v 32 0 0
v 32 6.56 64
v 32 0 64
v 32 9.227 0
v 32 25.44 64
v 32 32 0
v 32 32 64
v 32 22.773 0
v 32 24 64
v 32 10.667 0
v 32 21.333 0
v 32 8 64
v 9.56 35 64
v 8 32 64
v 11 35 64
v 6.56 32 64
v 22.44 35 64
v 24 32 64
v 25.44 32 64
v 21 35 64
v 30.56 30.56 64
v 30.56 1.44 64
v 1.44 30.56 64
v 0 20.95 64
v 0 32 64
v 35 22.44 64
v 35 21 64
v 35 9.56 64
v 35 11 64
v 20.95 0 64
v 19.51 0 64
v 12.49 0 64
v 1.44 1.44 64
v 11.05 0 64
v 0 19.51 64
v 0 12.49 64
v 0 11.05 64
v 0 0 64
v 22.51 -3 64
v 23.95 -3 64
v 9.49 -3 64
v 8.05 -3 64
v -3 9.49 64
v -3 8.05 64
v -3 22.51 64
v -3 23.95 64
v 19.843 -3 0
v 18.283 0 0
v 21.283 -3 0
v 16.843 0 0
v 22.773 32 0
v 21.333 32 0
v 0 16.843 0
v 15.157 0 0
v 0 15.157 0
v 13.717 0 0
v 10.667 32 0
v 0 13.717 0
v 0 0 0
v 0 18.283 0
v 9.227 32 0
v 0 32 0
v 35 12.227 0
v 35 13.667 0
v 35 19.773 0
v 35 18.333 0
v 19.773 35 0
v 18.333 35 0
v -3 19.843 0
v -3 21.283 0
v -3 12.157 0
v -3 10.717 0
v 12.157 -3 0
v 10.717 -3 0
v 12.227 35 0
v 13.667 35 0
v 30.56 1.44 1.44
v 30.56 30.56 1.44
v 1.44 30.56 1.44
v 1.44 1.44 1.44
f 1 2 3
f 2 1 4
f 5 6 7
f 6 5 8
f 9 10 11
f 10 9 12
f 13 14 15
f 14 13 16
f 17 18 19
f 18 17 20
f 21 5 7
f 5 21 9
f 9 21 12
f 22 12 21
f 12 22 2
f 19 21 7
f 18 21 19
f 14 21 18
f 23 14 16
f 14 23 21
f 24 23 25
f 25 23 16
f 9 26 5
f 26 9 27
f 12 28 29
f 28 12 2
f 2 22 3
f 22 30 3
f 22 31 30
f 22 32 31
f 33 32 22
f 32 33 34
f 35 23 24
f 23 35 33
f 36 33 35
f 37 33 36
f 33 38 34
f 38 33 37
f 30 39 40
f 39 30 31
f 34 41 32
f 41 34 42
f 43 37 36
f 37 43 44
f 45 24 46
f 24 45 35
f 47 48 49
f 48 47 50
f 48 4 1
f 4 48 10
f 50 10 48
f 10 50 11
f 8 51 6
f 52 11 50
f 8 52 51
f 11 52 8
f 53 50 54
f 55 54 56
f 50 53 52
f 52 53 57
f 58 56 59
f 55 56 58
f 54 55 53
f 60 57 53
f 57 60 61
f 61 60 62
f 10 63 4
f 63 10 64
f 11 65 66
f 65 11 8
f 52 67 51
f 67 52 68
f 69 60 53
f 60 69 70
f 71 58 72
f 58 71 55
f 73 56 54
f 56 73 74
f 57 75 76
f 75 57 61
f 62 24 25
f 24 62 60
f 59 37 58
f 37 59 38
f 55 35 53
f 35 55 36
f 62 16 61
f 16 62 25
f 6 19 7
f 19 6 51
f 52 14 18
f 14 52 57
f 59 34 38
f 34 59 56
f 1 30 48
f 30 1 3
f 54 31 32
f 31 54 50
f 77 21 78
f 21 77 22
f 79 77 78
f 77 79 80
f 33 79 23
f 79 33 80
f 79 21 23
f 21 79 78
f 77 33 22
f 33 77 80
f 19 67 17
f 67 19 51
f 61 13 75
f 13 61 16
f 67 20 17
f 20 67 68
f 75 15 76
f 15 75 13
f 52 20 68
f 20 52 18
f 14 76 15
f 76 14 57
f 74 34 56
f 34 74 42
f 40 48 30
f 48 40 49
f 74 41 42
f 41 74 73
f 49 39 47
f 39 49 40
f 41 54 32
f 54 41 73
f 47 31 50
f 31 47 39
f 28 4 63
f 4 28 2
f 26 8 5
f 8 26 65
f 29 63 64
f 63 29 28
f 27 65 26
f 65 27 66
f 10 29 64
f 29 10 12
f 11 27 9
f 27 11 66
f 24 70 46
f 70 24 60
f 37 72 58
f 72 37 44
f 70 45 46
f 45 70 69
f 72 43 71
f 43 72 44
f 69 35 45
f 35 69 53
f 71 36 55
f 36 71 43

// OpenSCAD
// file: src/units.scad
/* * units.scad
 *
 * Part of the Modular Drawer System.
 *
 * (c) 2015 max thom stahl. Released under the Creative Commons Share-Alike
 * license. See LICENSE for details.
 */

include <configuration.scad>
include <connectors.scad>

module unit(w, h) {
  difference() {
    cube([UNIT_X * w, UNIT_Y * h, UNIT_Z]);
    translate([WALL_THICKNESS, WALL_THICKNESS, WALL_THICKNESS])
      cube([w*UNIT_X - 2*WALL_THICKNESS, h*UNIT_Y - 2*WALL_THICKNESS, UNIT_Z]);
  }
  for(i = [0:w-1]) {
    translate([i*UNIT_X + UNIT_X/2, h*UNIT_Y, 0])
      rotate([0,0,90])
      connector_female();
    translate([i*UNIT_X + UNIT_X/2, -GROOVE_DEPTH, 0])
      rotate([0,0,270])
      connector_male();
  }
  for(j = [0:h-1]) {
    translate([w*UNIT_X, j*UNIT_Y + UNIT_Y/2, 0])
      rotate([0,0,0])
      connector_female();
    translate([-GROOVE_DEPTH, j*UNIT_Y + UNIT_Y/2, 0])
      rotate([0,0,180])
      connector_male();
  }
}
// file: src/drawers.scad
/*
 * drawers.scad
 *
 * Part of the Modular Drawer System.
 *
 * (c) 2015 max thom stahl. Released under the Creative Commons Share-Alike
 * license. See LICENSE for details.
 */

include <configuration.scad>

module drawer(w, h) {
  difference() {
    union() {
      cube([UNIT_Z - WALL_THICKNESS, UNIT_X * w, UNIT_Y * h]);
      hull() {
        translate([UNIT_Z - 2*WALL_THICKNESS, UNIT_X * w / 3, UNIT_Y * h / 2])
          cube([WALL_THICKNESS, UNIT_X*w/3, WALL_THICKNESS]);
        translate([UNIT_Z + 2*WALL_THICKNESS, UNIT_X * w / 3, UNIT_Y * h / 2 + 3*WALL_THICKNESS])
          cube([WALL_THICKNESS, UNIT_X*w/3, WALL_THICKNESS]);
      }
    }
    translate([WALL_THICKNESS, WALL_THICKNESS, WALL_THICKNESS])
      cube([UNIT_Z - 3*WALL_THICKNESS, w*UNIT_Y - 2*WALL_THICKNESS, h*UNIT_X]);
  }
}
// file: src/connectors.scad
module connector(w_top, w_bottom) {
  difference() {
    polyhedron(points=[
      [0, -w_top/2 - WALL_THICKNESS, UNIT_Z],                         // [0]
      [0, w_top/2 + WALL_THICKNESS, UNIT_Z],                          // [1]
      [GROOVE_DEPTH, w_top/2-GROOVE_DEPTH + WALL_THICKNESS, UNIT_Z],  // [2]
      [GROOVE_DEPTH, -w_top/2+GROOVE_DEPTH - WALL_THICKNESS, UNIT_Z], // [3]
      [0, -w_bottom/2 - WALL_THICKNESS, 0],                           // [4]
      [GROOVE_DEPTH, -w_bottom/2+GROOVE_DEPTH - WALL_THICKNESS, 0],   // [5]
      [GROOVE_DEPTH, w_bottom/2-GROOVE_DEPTH + WALL_THICKNESS, 0],    // [6]
      [0, w_bottom/2 + WALL_THICKNESS, 0]                             // [7]
    ], faces=[
      [0,3,5,4], [5,6,7,4], [6,2,1,7], [0,1,2,3], [3,2,6,5], [1,0,4,7]
    ]);
    polyhedron(points=[
      [0, -w_top/2, UNIT_Z],                         // [0]
      [0, w_top/2, UNIT_Z],                          // [1]
      [GROOVE_DEPTH, w_top/2-GROOVE_DEPTH, UNIT_Z],  // [2]
      [GROOVE_DEPTH, -w_top/2+GROOVE_DEPTH, UNIT_Z], // [3]
      [0, -w_bottom/2, 0],                           // [4]
      [GROOVE_DEPTH, -w_bottom/2+GROOVE_DEPTH, 0],   // [5]
      [GROOVE_DEPTH, w_bottom/2-GROOVE_DEPTH, 0],    // [6]
      [0, w_bottom/2, 0]                             // [7]
    ], faces=[
      [0,3,5,4], [5,6,7,4], [6,2,1,7], [0,1,2,3], [3,2,6,5], [1,0,4,7]
    ]);
  }
}

module connector_female() {
  connector(GROOVE_W_TOP, GROOVE_W_BOTTOM, GROOVE_DEPTH);
}

module connector_male() {
  scale([-1,1,1])
    connector(GROOVE_W_TOP - 2*WALL_THICKNESS - 0.1, GROOVE_W_BOTTOM - 2*WALL_THICKNESS - 0.1, GROOVE_DEPTH);
}
// file: src/configuration.scad
/*
 * configuration.scad
 *
 * Part of the Modular Drawer System.
 *
 * (c) 2015 max thom stahl. Released under the Creative Commons Share-Alike
 * license. See LICENSE for details.
 */

//--[ Unit sizes ]-------------------------------------------------------------

UNIT_X = 32.0; // These set the width/height/depth of the smallest possible
UNIT_Y = 32.0; // module for this system.
UNIT_Z = 64.0;

//--[ Global wall thickness ]--------------------------------------------------

calculated_extrusion_width = 0.48;
WALL_THICKNESS = calculated_extrusion_width * 3;

//--[ Drawer sizes ]-----------------------------------------------------------

drawer_gap = 0.5;

//--[ Connector settings ]-----------------------------------------------------

GROOVE_W_TOP = UNIT_Y / 2;
GROOVE_W_BOTTOM = UNIT_Y / 3;
GROOVE_DEPTH = 3.0;
// main file
/*
 * drawer_module.scad
 *
 * Part of the Modular Drawer System.
 *
 * See comments for how to customize.
 *
 * (c) 2015 max thom stahl. Released under the Creative Commons Share-Alike
 * license. See LICENSE for details.
 */

include <src/configuration.scad>
include <src/connectors.scad>
include <src/drawers.scad>
include <src/units.scad>

MODULE_WIDTH = 1;
MODULE_HEIGHT = 1;

GENERATE_UNIT = 1;
GENERATE_DRAWER = 0;

if (GENERATE_UNIT == 1) {
  unit(w=MODULE_WIDTH, h=MODULE_HEIGHT);
}
if (GENERATE_DRAWER == 1) {
  drawer(w=MODULE_WIDTH, h=MODULE_HEIGHT);
}
